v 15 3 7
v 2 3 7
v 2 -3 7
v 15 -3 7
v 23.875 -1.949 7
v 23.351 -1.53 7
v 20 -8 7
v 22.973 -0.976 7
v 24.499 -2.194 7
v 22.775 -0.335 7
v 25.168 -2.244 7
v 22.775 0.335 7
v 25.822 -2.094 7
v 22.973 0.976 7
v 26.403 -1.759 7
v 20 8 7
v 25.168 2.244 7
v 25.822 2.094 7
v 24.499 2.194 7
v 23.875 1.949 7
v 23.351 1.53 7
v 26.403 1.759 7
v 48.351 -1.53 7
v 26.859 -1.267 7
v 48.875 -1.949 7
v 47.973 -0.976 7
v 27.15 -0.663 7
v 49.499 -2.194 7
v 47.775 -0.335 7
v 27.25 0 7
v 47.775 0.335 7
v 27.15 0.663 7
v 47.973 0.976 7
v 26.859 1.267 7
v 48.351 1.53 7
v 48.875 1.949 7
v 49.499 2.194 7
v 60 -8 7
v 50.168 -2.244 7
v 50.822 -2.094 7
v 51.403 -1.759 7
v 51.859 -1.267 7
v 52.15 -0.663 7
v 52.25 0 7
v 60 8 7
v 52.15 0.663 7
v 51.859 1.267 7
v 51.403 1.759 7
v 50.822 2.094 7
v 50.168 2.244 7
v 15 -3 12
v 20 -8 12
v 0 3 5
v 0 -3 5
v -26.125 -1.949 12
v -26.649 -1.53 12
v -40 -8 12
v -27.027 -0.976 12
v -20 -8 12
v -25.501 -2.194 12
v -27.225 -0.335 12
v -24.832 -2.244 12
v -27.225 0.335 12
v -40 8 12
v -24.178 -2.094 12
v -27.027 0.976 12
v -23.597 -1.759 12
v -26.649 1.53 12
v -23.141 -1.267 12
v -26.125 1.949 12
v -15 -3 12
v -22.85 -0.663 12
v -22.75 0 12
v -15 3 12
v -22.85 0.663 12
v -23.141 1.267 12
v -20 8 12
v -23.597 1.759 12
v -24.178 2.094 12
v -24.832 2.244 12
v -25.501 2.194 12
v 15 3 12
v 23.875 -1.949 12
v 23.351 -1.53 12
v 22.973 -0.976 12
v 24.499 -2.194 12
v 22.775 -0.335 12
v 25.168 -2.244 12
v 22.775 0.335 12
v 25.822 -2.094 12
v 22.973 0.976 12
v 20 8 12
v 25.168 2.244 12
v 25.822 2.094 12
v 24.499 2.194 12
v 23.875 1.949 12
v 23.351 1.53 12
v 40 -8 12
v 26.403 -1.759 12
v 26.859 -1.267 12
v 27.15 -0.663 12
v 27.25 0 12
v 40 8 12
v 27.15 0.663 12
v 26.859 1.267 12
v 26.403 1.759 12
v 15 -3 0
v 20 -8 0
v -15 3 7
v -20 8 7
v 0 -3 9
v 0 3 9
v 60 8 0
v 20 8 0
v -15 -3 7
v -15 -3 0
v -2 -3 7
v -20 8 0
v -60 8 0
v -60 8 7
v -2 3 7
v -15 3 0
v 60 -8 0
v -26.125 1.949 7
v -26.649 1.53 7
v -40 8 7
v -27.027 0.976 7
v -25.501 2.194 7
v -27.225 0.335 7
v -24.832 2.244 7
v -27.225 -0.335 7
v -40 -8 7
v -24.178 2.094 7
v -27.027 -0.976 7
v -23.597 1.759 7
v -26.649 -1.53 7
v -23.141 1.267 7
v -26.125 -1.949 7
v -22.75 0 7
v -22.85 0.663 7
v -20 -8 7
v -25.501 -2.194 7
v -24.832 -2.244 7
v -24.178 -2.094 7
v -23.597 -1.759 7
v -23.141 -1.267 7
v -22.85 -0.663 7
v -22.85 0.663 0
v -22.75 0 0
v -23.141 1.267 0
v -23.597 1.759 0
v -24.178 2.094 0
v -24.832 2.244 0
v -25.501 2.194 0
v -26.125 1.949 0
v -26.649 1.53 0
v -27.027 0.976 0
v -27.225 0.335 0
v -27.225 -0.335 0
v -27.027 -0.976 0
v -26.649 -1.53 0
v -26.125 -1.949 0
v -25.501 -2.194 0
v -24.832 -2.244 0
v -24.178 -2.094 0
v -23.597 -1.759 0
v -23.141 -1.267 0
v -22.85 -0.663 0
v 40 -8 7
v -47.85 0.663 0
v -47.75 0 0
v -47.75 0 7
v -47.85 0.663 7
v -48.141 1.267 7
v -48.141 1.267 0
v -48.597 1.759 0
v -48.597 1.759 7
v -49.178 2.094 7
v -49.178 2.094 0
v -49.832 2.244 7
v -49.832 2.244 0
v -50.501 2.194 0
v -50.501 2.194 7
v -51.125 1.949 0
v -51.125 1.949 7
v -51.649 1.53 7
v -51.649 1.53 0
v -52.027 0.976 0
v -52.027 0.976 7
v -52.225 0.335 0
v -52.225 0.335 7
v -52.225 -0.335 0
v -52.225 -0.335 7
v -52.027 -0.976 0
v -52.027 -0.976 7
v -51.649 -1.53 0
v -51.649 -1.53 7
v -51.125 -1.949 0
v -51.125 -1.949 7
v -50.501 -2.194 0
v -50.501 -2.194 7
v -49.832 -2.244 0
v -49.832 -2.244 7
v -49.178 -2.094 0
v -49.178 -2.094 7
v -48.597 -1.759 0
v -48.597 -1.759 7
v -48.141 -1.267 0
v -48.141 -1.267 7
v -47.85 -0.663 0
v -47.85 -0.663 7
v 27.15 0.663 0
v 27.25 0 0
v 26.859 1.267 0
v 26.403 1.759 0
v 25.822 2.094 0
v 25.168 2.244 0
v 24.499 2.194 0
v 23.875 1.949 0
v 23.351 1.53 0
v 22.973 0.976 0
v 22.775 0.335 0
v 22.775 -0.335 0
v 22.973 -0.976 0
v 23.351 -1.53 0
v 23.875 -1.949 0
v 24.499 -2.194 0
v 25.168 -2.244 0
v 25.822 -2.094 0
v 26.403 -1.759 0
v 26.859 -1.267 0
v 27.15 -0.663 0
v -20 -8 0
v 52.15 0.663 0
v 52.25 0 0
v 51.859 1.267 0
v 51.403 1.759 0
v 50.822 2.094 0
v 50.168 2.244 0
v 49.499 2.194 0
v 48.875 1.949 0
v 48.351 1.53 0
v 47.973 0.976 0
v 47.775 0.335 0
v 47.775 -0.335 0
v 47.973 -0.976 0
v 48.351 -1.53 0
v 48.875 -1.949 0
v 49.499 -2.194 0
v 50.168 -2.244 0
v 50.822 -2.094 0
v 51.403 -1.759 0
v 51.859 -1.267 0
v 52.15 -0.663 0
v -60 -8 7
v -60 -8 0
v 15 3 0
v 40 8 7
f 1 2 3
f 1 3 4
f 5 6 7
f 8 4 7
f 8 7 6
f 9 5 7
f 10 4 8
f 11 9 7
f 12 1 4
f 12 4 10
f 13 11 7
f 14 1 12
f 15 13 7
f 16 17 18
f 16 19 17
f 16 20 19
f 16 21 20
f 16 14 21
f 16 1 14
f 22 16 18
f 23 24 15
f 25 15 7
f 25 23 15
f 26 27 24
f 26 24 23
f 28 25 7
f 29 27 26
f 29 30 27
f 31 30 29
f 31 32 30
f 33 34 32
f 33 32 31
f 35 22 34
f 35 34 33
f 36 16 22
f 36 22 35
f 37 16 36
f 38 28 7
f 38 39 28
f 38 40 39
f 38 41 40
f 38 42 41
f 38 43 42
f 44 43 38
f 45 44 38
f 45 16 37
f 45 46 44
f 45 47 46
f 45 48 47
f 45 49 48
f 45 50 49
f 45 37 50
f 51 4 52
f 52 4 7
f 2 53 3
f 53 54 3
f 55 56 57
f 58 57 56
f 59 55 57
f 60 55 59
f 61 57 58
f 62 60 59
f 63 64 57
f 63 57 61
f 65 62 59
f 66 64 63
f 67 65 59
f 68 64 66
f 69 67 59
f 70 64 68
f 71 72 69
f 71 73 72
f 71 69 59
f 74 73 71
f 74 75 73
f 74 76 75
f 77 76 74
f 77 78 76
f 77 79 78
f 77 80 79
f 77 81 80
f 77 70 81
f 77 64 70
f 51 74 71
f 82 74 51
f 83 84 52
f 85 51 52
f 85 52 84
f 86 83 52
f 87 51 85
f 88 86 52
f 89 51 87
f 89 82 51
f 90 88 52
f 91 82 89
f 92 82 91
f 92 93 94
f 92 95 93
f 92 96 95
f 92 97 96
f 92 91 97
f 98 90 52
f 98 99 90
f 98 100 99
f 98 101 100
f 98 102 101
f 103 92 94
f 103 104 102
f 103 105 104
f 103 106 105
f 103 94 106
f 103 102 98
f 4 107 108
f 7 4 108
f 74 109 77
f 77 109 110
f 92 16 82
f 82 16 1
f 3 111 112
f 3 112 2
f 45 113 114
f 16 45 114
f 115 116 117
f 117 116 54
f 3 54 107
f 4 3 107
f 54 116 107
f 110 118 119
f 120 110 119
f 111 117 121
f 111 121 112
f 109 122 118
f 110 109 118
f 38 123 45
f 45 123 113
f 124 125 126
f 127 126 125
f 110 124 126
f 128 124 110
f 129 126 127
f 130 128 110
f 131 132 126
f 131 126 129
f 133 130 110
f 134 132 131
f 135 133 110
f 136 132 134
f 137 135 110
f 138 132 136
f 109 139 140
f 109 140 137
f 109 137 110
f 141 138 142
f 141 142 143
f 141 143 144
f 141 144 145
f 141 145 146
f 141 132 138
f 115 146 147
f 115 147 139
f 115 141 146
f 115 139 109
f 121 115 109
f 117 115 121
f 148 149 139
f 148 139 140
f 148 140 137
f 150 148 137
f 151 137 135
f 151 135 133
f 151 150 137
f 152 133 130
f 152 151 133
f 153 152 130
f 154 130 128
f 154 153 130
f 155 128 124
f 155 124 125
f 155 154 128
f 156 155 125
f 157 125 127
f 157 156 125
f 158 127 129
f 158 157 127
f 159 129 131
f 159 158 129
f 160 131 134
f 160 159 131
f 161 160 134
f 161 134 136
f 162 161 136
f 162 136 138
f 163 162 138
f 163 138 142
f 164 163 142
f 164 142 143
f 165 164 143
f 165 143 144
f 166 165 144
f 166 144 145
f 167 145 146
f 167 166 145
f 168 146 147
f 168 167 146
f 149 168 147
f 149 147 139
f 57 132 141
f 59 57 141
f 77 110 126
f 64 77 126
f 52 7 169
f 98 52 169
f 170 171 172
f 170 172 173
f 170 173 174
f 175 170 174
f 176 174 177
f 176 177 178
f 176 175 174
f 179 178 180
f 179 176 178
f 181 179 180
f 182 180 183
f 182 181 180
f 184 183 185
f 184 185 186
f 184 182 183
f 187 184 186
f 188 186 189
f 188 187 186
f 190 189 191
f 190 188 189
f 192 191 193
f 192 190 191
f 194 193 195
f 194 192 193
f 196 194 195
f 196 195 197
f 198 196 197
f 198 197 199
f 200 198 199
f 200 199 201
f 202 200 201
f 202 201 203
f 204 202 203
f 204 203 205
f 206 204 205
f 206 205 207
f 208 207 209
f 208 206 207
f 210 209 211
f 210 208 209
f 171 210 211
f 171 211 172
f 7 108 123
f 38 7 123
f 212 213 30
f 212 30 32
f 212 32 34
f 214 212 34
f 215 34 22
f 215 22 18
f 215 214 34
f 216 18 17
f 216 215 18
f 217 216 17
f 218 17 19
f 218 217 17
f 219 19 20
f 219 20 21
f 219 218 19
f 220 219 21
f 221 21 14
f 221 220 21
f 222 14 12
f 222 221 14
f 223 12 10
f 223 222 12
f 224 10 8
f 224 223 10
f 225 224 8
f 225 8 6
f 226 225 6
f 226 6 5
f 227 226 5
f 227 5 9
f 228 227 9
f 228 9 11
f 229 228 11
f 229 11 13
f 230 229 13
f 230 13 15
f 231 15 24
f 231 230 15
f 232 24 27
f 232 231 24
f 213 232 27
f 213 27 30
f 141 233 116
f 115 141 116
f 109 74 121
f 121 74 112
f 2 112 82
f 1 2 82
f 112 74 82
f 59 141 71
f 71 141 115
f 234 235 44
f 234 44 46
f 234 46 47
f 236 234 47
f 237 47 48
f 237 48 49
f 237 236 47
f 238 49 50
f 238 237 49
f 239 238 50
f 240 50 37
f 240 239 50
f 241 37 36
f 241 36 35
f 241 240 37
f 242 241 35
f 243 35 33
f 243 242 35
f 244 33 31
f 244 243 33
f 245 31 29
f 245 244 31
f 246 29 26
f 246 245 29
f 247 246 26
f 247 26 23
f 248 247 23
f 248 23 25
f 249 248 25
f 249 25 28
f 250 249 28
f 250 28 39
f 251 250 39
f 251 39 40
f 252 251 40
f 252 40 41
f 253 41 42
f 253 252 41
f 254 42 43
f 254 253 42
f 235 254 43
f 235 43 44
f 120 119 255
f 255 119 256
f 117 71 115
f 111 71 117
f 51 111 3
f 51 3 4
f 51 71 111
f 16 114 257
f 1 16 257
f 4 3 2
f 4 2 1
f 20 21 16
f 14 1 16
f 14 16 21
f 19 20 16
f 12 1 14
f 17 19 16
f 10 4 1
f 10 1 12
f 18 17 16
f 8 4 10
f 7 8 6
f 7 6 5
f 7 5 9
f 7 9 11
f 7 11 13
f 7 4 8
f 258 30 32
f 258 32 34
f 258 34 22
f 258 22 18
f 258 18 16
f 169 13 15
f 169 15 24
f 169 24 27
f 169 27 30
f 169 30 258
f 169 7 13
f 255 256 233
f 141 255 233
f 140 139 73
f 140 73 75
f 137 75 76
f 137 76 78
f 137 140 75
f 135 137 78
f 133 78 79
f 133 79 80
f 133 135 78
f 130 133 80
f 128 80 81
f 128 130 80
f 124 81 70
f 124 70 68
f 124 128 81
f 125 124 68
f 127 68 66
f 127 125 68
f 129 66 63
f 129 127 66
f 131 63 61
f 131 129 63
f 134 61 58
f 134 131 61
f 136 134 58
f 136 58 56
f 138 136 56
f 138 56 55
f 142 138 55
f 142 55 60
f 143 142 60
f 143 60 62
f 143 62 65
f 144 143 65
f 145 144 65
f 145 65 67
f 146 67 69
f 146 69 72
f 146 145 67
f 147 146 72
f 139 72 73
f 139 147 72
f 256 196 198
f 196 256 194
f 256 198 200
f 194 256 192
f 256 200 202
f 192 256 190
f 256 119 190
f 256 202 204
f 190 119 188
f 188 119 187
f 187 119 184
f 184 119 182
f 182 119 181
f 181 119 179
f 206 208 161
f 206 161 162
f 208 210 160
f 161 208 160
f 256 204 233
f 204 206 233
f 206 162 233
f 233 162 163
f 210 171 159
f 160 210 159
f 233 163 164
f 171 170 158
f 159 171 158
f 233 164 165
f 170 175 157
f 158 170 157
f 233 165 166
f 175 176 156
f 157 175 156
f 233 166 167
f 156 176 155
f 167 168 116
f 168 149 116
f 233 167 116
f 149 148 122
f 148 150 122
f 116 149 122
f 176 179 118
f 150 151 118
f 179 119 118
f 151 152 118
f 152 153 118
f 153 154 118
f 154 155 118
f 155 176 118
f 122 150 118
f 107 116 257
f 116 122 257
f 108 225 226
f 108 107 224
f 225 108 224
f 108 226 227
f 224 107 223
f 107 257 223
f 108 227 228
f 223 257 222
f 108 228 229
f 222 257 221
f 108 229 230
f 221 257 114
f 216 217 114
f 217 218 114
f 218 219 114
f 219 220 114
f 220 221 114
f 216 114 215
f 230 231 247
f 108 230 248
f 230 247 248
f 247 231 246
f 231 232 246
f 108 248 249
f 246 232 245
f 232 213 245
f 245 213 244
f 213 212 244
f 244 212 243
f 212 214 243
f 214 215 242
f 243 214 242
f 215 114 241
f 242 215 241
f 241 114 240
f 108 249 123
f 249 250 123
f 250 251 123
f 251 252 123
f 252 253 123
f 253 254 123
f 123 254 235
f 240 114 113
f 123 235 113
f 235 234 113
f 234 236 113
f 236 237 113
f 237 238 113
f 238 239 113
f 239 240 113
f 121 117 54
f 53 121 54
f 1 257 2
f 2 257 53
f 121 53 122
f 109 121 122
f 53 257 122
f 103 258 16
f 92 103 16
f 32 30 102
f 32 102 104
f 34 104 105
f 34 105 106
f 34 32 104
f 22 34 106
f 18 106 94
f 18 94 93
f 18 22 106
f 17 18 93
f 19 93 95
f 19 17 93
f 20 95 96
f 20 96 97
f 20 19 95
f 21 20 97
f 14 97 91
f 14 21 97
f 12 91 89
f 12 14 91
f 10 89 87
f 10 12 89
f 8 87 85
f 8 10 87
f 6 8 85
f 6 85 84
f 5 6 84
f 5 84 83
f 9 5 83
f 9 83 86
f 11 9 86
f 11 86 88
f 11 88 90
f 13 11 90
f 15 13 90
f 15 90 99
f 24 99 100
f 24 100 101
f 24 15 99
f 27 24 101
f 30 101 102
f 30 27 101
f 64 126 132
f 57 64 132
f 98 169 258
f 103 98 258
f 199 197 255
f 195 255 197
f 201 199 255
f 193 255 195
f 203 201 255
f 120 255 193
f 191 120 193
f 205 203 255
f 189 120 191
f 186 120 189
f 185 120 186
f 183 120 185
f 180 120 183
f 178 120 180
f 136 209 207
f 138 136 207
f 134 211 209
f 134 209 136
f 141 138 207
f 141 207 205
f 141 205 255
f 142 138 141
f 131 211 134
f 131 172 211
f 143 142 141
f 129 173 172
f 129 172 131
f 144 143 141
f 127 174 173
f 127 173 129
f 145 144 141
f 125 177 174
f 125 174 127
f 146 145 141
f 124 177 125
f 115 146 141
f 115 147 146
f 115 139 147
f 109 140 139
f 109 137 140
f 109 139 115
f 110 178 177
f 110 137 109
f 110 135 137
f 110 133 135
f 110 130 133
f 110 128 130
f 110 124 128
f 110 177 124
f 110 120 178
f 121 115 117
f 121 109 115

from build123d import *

# Parameters (mm, degrees)
F0_R     = 2.25
F1_DEPTH = 7
F3_DEPTH = 3
F4_DEPTH = 3
F5_R     = 2.25
F6_DEPTH = 5
F7_DEPTH = 5


with BuildPart() as f1:
    # F0 (on Top) → F1 (new body)
    with BuildSketch(Plane.XY):
        Polygon((0, -3), (0, 0), (0, 3), (-15, 3), (-20, 8), (-30, 8), (-54.389398545, 8), (-60, 8), (-60, -8), (-54.389398545, -8), (-30, -8), (-20, -8), (-15, -3), align=None)
        with Locations((-50, 0)):
            Circle(F0_R, mode=Mode.SUBTRACT)
        with Locations((-25, 0)):
            Circle(F0_R, mode=Mode.SUBTRACT)
        Polygon((0, 3), (0, 0), (0, -3), (15, -3), (20, -8), (30, -8), (53.1751337647, -8), (60, -8), (60, 8), (53.1751337647, 8), (30, 8), (20, 8), (15, 3), align=None)
        with Locations((25, 0)):
            Circle(F0_R, mode=Mode.SUBTRACT)
        with Locations((50, 0)):
            Circle(F0_R, mode=Mode.SUBTRACT)
    extrude(amount=F1_DEPTH)

    # F2 (on Front) → F3 (cut, symmetric)
    with BuildSketch(Plane.XZ):
        Polygon((2, 7), (-2, 7), (0, 5), align=None)
    extrude(amount=F3_DEPTH, both=True, mode=Mode.SUBTRACT)


with BuildPart() as f4:
    # F2 (on Front) → F4 (new body, symmetric)
    with BuildSketch(Plane.XZ):
        Polygon((-35, 7), (-15, 7), (-2, 7), (0, 9), (2, 7), (15, 7), (35, 7), (35, 12), (-35, 12), align=None)
    extrude(amount=F4_DEPTH, both=True)

    # F5 (on face) → F6 (join)
    with BuildSketch(Plane.XY.offset(7)):
        Polygon((-15, -3), (-15, 3), (-20, 8), (-40, 8), (-40, -8), (-20, -8), align=None)
        with Locations((-25, 0)):
            Circle(F5_R, mode=Mode.SUBTRACT)
        Polygon((20, 8), (15, 3), (15, -3), (20, -8), (40, -8), (40, 8), align=None)
        with Locations((25, 0)):
            Circle(F5_R, mode=Mode.SUBTRACT)
    extrude(amount=F6_DEPTH)

    # F5 (on face) → F7 (cut)
    with BuildSketch(Plane.XY.offset(7)):
        with Locations((-25, 0)):
            Circle(F5_R)
        with Locations((25, 0)):
            Circle(F5_R)
    extrude(amount=F7_DEPTH, mode=Mode.SUBTRACT)


solid = Compound([f1.part, f4.part])
